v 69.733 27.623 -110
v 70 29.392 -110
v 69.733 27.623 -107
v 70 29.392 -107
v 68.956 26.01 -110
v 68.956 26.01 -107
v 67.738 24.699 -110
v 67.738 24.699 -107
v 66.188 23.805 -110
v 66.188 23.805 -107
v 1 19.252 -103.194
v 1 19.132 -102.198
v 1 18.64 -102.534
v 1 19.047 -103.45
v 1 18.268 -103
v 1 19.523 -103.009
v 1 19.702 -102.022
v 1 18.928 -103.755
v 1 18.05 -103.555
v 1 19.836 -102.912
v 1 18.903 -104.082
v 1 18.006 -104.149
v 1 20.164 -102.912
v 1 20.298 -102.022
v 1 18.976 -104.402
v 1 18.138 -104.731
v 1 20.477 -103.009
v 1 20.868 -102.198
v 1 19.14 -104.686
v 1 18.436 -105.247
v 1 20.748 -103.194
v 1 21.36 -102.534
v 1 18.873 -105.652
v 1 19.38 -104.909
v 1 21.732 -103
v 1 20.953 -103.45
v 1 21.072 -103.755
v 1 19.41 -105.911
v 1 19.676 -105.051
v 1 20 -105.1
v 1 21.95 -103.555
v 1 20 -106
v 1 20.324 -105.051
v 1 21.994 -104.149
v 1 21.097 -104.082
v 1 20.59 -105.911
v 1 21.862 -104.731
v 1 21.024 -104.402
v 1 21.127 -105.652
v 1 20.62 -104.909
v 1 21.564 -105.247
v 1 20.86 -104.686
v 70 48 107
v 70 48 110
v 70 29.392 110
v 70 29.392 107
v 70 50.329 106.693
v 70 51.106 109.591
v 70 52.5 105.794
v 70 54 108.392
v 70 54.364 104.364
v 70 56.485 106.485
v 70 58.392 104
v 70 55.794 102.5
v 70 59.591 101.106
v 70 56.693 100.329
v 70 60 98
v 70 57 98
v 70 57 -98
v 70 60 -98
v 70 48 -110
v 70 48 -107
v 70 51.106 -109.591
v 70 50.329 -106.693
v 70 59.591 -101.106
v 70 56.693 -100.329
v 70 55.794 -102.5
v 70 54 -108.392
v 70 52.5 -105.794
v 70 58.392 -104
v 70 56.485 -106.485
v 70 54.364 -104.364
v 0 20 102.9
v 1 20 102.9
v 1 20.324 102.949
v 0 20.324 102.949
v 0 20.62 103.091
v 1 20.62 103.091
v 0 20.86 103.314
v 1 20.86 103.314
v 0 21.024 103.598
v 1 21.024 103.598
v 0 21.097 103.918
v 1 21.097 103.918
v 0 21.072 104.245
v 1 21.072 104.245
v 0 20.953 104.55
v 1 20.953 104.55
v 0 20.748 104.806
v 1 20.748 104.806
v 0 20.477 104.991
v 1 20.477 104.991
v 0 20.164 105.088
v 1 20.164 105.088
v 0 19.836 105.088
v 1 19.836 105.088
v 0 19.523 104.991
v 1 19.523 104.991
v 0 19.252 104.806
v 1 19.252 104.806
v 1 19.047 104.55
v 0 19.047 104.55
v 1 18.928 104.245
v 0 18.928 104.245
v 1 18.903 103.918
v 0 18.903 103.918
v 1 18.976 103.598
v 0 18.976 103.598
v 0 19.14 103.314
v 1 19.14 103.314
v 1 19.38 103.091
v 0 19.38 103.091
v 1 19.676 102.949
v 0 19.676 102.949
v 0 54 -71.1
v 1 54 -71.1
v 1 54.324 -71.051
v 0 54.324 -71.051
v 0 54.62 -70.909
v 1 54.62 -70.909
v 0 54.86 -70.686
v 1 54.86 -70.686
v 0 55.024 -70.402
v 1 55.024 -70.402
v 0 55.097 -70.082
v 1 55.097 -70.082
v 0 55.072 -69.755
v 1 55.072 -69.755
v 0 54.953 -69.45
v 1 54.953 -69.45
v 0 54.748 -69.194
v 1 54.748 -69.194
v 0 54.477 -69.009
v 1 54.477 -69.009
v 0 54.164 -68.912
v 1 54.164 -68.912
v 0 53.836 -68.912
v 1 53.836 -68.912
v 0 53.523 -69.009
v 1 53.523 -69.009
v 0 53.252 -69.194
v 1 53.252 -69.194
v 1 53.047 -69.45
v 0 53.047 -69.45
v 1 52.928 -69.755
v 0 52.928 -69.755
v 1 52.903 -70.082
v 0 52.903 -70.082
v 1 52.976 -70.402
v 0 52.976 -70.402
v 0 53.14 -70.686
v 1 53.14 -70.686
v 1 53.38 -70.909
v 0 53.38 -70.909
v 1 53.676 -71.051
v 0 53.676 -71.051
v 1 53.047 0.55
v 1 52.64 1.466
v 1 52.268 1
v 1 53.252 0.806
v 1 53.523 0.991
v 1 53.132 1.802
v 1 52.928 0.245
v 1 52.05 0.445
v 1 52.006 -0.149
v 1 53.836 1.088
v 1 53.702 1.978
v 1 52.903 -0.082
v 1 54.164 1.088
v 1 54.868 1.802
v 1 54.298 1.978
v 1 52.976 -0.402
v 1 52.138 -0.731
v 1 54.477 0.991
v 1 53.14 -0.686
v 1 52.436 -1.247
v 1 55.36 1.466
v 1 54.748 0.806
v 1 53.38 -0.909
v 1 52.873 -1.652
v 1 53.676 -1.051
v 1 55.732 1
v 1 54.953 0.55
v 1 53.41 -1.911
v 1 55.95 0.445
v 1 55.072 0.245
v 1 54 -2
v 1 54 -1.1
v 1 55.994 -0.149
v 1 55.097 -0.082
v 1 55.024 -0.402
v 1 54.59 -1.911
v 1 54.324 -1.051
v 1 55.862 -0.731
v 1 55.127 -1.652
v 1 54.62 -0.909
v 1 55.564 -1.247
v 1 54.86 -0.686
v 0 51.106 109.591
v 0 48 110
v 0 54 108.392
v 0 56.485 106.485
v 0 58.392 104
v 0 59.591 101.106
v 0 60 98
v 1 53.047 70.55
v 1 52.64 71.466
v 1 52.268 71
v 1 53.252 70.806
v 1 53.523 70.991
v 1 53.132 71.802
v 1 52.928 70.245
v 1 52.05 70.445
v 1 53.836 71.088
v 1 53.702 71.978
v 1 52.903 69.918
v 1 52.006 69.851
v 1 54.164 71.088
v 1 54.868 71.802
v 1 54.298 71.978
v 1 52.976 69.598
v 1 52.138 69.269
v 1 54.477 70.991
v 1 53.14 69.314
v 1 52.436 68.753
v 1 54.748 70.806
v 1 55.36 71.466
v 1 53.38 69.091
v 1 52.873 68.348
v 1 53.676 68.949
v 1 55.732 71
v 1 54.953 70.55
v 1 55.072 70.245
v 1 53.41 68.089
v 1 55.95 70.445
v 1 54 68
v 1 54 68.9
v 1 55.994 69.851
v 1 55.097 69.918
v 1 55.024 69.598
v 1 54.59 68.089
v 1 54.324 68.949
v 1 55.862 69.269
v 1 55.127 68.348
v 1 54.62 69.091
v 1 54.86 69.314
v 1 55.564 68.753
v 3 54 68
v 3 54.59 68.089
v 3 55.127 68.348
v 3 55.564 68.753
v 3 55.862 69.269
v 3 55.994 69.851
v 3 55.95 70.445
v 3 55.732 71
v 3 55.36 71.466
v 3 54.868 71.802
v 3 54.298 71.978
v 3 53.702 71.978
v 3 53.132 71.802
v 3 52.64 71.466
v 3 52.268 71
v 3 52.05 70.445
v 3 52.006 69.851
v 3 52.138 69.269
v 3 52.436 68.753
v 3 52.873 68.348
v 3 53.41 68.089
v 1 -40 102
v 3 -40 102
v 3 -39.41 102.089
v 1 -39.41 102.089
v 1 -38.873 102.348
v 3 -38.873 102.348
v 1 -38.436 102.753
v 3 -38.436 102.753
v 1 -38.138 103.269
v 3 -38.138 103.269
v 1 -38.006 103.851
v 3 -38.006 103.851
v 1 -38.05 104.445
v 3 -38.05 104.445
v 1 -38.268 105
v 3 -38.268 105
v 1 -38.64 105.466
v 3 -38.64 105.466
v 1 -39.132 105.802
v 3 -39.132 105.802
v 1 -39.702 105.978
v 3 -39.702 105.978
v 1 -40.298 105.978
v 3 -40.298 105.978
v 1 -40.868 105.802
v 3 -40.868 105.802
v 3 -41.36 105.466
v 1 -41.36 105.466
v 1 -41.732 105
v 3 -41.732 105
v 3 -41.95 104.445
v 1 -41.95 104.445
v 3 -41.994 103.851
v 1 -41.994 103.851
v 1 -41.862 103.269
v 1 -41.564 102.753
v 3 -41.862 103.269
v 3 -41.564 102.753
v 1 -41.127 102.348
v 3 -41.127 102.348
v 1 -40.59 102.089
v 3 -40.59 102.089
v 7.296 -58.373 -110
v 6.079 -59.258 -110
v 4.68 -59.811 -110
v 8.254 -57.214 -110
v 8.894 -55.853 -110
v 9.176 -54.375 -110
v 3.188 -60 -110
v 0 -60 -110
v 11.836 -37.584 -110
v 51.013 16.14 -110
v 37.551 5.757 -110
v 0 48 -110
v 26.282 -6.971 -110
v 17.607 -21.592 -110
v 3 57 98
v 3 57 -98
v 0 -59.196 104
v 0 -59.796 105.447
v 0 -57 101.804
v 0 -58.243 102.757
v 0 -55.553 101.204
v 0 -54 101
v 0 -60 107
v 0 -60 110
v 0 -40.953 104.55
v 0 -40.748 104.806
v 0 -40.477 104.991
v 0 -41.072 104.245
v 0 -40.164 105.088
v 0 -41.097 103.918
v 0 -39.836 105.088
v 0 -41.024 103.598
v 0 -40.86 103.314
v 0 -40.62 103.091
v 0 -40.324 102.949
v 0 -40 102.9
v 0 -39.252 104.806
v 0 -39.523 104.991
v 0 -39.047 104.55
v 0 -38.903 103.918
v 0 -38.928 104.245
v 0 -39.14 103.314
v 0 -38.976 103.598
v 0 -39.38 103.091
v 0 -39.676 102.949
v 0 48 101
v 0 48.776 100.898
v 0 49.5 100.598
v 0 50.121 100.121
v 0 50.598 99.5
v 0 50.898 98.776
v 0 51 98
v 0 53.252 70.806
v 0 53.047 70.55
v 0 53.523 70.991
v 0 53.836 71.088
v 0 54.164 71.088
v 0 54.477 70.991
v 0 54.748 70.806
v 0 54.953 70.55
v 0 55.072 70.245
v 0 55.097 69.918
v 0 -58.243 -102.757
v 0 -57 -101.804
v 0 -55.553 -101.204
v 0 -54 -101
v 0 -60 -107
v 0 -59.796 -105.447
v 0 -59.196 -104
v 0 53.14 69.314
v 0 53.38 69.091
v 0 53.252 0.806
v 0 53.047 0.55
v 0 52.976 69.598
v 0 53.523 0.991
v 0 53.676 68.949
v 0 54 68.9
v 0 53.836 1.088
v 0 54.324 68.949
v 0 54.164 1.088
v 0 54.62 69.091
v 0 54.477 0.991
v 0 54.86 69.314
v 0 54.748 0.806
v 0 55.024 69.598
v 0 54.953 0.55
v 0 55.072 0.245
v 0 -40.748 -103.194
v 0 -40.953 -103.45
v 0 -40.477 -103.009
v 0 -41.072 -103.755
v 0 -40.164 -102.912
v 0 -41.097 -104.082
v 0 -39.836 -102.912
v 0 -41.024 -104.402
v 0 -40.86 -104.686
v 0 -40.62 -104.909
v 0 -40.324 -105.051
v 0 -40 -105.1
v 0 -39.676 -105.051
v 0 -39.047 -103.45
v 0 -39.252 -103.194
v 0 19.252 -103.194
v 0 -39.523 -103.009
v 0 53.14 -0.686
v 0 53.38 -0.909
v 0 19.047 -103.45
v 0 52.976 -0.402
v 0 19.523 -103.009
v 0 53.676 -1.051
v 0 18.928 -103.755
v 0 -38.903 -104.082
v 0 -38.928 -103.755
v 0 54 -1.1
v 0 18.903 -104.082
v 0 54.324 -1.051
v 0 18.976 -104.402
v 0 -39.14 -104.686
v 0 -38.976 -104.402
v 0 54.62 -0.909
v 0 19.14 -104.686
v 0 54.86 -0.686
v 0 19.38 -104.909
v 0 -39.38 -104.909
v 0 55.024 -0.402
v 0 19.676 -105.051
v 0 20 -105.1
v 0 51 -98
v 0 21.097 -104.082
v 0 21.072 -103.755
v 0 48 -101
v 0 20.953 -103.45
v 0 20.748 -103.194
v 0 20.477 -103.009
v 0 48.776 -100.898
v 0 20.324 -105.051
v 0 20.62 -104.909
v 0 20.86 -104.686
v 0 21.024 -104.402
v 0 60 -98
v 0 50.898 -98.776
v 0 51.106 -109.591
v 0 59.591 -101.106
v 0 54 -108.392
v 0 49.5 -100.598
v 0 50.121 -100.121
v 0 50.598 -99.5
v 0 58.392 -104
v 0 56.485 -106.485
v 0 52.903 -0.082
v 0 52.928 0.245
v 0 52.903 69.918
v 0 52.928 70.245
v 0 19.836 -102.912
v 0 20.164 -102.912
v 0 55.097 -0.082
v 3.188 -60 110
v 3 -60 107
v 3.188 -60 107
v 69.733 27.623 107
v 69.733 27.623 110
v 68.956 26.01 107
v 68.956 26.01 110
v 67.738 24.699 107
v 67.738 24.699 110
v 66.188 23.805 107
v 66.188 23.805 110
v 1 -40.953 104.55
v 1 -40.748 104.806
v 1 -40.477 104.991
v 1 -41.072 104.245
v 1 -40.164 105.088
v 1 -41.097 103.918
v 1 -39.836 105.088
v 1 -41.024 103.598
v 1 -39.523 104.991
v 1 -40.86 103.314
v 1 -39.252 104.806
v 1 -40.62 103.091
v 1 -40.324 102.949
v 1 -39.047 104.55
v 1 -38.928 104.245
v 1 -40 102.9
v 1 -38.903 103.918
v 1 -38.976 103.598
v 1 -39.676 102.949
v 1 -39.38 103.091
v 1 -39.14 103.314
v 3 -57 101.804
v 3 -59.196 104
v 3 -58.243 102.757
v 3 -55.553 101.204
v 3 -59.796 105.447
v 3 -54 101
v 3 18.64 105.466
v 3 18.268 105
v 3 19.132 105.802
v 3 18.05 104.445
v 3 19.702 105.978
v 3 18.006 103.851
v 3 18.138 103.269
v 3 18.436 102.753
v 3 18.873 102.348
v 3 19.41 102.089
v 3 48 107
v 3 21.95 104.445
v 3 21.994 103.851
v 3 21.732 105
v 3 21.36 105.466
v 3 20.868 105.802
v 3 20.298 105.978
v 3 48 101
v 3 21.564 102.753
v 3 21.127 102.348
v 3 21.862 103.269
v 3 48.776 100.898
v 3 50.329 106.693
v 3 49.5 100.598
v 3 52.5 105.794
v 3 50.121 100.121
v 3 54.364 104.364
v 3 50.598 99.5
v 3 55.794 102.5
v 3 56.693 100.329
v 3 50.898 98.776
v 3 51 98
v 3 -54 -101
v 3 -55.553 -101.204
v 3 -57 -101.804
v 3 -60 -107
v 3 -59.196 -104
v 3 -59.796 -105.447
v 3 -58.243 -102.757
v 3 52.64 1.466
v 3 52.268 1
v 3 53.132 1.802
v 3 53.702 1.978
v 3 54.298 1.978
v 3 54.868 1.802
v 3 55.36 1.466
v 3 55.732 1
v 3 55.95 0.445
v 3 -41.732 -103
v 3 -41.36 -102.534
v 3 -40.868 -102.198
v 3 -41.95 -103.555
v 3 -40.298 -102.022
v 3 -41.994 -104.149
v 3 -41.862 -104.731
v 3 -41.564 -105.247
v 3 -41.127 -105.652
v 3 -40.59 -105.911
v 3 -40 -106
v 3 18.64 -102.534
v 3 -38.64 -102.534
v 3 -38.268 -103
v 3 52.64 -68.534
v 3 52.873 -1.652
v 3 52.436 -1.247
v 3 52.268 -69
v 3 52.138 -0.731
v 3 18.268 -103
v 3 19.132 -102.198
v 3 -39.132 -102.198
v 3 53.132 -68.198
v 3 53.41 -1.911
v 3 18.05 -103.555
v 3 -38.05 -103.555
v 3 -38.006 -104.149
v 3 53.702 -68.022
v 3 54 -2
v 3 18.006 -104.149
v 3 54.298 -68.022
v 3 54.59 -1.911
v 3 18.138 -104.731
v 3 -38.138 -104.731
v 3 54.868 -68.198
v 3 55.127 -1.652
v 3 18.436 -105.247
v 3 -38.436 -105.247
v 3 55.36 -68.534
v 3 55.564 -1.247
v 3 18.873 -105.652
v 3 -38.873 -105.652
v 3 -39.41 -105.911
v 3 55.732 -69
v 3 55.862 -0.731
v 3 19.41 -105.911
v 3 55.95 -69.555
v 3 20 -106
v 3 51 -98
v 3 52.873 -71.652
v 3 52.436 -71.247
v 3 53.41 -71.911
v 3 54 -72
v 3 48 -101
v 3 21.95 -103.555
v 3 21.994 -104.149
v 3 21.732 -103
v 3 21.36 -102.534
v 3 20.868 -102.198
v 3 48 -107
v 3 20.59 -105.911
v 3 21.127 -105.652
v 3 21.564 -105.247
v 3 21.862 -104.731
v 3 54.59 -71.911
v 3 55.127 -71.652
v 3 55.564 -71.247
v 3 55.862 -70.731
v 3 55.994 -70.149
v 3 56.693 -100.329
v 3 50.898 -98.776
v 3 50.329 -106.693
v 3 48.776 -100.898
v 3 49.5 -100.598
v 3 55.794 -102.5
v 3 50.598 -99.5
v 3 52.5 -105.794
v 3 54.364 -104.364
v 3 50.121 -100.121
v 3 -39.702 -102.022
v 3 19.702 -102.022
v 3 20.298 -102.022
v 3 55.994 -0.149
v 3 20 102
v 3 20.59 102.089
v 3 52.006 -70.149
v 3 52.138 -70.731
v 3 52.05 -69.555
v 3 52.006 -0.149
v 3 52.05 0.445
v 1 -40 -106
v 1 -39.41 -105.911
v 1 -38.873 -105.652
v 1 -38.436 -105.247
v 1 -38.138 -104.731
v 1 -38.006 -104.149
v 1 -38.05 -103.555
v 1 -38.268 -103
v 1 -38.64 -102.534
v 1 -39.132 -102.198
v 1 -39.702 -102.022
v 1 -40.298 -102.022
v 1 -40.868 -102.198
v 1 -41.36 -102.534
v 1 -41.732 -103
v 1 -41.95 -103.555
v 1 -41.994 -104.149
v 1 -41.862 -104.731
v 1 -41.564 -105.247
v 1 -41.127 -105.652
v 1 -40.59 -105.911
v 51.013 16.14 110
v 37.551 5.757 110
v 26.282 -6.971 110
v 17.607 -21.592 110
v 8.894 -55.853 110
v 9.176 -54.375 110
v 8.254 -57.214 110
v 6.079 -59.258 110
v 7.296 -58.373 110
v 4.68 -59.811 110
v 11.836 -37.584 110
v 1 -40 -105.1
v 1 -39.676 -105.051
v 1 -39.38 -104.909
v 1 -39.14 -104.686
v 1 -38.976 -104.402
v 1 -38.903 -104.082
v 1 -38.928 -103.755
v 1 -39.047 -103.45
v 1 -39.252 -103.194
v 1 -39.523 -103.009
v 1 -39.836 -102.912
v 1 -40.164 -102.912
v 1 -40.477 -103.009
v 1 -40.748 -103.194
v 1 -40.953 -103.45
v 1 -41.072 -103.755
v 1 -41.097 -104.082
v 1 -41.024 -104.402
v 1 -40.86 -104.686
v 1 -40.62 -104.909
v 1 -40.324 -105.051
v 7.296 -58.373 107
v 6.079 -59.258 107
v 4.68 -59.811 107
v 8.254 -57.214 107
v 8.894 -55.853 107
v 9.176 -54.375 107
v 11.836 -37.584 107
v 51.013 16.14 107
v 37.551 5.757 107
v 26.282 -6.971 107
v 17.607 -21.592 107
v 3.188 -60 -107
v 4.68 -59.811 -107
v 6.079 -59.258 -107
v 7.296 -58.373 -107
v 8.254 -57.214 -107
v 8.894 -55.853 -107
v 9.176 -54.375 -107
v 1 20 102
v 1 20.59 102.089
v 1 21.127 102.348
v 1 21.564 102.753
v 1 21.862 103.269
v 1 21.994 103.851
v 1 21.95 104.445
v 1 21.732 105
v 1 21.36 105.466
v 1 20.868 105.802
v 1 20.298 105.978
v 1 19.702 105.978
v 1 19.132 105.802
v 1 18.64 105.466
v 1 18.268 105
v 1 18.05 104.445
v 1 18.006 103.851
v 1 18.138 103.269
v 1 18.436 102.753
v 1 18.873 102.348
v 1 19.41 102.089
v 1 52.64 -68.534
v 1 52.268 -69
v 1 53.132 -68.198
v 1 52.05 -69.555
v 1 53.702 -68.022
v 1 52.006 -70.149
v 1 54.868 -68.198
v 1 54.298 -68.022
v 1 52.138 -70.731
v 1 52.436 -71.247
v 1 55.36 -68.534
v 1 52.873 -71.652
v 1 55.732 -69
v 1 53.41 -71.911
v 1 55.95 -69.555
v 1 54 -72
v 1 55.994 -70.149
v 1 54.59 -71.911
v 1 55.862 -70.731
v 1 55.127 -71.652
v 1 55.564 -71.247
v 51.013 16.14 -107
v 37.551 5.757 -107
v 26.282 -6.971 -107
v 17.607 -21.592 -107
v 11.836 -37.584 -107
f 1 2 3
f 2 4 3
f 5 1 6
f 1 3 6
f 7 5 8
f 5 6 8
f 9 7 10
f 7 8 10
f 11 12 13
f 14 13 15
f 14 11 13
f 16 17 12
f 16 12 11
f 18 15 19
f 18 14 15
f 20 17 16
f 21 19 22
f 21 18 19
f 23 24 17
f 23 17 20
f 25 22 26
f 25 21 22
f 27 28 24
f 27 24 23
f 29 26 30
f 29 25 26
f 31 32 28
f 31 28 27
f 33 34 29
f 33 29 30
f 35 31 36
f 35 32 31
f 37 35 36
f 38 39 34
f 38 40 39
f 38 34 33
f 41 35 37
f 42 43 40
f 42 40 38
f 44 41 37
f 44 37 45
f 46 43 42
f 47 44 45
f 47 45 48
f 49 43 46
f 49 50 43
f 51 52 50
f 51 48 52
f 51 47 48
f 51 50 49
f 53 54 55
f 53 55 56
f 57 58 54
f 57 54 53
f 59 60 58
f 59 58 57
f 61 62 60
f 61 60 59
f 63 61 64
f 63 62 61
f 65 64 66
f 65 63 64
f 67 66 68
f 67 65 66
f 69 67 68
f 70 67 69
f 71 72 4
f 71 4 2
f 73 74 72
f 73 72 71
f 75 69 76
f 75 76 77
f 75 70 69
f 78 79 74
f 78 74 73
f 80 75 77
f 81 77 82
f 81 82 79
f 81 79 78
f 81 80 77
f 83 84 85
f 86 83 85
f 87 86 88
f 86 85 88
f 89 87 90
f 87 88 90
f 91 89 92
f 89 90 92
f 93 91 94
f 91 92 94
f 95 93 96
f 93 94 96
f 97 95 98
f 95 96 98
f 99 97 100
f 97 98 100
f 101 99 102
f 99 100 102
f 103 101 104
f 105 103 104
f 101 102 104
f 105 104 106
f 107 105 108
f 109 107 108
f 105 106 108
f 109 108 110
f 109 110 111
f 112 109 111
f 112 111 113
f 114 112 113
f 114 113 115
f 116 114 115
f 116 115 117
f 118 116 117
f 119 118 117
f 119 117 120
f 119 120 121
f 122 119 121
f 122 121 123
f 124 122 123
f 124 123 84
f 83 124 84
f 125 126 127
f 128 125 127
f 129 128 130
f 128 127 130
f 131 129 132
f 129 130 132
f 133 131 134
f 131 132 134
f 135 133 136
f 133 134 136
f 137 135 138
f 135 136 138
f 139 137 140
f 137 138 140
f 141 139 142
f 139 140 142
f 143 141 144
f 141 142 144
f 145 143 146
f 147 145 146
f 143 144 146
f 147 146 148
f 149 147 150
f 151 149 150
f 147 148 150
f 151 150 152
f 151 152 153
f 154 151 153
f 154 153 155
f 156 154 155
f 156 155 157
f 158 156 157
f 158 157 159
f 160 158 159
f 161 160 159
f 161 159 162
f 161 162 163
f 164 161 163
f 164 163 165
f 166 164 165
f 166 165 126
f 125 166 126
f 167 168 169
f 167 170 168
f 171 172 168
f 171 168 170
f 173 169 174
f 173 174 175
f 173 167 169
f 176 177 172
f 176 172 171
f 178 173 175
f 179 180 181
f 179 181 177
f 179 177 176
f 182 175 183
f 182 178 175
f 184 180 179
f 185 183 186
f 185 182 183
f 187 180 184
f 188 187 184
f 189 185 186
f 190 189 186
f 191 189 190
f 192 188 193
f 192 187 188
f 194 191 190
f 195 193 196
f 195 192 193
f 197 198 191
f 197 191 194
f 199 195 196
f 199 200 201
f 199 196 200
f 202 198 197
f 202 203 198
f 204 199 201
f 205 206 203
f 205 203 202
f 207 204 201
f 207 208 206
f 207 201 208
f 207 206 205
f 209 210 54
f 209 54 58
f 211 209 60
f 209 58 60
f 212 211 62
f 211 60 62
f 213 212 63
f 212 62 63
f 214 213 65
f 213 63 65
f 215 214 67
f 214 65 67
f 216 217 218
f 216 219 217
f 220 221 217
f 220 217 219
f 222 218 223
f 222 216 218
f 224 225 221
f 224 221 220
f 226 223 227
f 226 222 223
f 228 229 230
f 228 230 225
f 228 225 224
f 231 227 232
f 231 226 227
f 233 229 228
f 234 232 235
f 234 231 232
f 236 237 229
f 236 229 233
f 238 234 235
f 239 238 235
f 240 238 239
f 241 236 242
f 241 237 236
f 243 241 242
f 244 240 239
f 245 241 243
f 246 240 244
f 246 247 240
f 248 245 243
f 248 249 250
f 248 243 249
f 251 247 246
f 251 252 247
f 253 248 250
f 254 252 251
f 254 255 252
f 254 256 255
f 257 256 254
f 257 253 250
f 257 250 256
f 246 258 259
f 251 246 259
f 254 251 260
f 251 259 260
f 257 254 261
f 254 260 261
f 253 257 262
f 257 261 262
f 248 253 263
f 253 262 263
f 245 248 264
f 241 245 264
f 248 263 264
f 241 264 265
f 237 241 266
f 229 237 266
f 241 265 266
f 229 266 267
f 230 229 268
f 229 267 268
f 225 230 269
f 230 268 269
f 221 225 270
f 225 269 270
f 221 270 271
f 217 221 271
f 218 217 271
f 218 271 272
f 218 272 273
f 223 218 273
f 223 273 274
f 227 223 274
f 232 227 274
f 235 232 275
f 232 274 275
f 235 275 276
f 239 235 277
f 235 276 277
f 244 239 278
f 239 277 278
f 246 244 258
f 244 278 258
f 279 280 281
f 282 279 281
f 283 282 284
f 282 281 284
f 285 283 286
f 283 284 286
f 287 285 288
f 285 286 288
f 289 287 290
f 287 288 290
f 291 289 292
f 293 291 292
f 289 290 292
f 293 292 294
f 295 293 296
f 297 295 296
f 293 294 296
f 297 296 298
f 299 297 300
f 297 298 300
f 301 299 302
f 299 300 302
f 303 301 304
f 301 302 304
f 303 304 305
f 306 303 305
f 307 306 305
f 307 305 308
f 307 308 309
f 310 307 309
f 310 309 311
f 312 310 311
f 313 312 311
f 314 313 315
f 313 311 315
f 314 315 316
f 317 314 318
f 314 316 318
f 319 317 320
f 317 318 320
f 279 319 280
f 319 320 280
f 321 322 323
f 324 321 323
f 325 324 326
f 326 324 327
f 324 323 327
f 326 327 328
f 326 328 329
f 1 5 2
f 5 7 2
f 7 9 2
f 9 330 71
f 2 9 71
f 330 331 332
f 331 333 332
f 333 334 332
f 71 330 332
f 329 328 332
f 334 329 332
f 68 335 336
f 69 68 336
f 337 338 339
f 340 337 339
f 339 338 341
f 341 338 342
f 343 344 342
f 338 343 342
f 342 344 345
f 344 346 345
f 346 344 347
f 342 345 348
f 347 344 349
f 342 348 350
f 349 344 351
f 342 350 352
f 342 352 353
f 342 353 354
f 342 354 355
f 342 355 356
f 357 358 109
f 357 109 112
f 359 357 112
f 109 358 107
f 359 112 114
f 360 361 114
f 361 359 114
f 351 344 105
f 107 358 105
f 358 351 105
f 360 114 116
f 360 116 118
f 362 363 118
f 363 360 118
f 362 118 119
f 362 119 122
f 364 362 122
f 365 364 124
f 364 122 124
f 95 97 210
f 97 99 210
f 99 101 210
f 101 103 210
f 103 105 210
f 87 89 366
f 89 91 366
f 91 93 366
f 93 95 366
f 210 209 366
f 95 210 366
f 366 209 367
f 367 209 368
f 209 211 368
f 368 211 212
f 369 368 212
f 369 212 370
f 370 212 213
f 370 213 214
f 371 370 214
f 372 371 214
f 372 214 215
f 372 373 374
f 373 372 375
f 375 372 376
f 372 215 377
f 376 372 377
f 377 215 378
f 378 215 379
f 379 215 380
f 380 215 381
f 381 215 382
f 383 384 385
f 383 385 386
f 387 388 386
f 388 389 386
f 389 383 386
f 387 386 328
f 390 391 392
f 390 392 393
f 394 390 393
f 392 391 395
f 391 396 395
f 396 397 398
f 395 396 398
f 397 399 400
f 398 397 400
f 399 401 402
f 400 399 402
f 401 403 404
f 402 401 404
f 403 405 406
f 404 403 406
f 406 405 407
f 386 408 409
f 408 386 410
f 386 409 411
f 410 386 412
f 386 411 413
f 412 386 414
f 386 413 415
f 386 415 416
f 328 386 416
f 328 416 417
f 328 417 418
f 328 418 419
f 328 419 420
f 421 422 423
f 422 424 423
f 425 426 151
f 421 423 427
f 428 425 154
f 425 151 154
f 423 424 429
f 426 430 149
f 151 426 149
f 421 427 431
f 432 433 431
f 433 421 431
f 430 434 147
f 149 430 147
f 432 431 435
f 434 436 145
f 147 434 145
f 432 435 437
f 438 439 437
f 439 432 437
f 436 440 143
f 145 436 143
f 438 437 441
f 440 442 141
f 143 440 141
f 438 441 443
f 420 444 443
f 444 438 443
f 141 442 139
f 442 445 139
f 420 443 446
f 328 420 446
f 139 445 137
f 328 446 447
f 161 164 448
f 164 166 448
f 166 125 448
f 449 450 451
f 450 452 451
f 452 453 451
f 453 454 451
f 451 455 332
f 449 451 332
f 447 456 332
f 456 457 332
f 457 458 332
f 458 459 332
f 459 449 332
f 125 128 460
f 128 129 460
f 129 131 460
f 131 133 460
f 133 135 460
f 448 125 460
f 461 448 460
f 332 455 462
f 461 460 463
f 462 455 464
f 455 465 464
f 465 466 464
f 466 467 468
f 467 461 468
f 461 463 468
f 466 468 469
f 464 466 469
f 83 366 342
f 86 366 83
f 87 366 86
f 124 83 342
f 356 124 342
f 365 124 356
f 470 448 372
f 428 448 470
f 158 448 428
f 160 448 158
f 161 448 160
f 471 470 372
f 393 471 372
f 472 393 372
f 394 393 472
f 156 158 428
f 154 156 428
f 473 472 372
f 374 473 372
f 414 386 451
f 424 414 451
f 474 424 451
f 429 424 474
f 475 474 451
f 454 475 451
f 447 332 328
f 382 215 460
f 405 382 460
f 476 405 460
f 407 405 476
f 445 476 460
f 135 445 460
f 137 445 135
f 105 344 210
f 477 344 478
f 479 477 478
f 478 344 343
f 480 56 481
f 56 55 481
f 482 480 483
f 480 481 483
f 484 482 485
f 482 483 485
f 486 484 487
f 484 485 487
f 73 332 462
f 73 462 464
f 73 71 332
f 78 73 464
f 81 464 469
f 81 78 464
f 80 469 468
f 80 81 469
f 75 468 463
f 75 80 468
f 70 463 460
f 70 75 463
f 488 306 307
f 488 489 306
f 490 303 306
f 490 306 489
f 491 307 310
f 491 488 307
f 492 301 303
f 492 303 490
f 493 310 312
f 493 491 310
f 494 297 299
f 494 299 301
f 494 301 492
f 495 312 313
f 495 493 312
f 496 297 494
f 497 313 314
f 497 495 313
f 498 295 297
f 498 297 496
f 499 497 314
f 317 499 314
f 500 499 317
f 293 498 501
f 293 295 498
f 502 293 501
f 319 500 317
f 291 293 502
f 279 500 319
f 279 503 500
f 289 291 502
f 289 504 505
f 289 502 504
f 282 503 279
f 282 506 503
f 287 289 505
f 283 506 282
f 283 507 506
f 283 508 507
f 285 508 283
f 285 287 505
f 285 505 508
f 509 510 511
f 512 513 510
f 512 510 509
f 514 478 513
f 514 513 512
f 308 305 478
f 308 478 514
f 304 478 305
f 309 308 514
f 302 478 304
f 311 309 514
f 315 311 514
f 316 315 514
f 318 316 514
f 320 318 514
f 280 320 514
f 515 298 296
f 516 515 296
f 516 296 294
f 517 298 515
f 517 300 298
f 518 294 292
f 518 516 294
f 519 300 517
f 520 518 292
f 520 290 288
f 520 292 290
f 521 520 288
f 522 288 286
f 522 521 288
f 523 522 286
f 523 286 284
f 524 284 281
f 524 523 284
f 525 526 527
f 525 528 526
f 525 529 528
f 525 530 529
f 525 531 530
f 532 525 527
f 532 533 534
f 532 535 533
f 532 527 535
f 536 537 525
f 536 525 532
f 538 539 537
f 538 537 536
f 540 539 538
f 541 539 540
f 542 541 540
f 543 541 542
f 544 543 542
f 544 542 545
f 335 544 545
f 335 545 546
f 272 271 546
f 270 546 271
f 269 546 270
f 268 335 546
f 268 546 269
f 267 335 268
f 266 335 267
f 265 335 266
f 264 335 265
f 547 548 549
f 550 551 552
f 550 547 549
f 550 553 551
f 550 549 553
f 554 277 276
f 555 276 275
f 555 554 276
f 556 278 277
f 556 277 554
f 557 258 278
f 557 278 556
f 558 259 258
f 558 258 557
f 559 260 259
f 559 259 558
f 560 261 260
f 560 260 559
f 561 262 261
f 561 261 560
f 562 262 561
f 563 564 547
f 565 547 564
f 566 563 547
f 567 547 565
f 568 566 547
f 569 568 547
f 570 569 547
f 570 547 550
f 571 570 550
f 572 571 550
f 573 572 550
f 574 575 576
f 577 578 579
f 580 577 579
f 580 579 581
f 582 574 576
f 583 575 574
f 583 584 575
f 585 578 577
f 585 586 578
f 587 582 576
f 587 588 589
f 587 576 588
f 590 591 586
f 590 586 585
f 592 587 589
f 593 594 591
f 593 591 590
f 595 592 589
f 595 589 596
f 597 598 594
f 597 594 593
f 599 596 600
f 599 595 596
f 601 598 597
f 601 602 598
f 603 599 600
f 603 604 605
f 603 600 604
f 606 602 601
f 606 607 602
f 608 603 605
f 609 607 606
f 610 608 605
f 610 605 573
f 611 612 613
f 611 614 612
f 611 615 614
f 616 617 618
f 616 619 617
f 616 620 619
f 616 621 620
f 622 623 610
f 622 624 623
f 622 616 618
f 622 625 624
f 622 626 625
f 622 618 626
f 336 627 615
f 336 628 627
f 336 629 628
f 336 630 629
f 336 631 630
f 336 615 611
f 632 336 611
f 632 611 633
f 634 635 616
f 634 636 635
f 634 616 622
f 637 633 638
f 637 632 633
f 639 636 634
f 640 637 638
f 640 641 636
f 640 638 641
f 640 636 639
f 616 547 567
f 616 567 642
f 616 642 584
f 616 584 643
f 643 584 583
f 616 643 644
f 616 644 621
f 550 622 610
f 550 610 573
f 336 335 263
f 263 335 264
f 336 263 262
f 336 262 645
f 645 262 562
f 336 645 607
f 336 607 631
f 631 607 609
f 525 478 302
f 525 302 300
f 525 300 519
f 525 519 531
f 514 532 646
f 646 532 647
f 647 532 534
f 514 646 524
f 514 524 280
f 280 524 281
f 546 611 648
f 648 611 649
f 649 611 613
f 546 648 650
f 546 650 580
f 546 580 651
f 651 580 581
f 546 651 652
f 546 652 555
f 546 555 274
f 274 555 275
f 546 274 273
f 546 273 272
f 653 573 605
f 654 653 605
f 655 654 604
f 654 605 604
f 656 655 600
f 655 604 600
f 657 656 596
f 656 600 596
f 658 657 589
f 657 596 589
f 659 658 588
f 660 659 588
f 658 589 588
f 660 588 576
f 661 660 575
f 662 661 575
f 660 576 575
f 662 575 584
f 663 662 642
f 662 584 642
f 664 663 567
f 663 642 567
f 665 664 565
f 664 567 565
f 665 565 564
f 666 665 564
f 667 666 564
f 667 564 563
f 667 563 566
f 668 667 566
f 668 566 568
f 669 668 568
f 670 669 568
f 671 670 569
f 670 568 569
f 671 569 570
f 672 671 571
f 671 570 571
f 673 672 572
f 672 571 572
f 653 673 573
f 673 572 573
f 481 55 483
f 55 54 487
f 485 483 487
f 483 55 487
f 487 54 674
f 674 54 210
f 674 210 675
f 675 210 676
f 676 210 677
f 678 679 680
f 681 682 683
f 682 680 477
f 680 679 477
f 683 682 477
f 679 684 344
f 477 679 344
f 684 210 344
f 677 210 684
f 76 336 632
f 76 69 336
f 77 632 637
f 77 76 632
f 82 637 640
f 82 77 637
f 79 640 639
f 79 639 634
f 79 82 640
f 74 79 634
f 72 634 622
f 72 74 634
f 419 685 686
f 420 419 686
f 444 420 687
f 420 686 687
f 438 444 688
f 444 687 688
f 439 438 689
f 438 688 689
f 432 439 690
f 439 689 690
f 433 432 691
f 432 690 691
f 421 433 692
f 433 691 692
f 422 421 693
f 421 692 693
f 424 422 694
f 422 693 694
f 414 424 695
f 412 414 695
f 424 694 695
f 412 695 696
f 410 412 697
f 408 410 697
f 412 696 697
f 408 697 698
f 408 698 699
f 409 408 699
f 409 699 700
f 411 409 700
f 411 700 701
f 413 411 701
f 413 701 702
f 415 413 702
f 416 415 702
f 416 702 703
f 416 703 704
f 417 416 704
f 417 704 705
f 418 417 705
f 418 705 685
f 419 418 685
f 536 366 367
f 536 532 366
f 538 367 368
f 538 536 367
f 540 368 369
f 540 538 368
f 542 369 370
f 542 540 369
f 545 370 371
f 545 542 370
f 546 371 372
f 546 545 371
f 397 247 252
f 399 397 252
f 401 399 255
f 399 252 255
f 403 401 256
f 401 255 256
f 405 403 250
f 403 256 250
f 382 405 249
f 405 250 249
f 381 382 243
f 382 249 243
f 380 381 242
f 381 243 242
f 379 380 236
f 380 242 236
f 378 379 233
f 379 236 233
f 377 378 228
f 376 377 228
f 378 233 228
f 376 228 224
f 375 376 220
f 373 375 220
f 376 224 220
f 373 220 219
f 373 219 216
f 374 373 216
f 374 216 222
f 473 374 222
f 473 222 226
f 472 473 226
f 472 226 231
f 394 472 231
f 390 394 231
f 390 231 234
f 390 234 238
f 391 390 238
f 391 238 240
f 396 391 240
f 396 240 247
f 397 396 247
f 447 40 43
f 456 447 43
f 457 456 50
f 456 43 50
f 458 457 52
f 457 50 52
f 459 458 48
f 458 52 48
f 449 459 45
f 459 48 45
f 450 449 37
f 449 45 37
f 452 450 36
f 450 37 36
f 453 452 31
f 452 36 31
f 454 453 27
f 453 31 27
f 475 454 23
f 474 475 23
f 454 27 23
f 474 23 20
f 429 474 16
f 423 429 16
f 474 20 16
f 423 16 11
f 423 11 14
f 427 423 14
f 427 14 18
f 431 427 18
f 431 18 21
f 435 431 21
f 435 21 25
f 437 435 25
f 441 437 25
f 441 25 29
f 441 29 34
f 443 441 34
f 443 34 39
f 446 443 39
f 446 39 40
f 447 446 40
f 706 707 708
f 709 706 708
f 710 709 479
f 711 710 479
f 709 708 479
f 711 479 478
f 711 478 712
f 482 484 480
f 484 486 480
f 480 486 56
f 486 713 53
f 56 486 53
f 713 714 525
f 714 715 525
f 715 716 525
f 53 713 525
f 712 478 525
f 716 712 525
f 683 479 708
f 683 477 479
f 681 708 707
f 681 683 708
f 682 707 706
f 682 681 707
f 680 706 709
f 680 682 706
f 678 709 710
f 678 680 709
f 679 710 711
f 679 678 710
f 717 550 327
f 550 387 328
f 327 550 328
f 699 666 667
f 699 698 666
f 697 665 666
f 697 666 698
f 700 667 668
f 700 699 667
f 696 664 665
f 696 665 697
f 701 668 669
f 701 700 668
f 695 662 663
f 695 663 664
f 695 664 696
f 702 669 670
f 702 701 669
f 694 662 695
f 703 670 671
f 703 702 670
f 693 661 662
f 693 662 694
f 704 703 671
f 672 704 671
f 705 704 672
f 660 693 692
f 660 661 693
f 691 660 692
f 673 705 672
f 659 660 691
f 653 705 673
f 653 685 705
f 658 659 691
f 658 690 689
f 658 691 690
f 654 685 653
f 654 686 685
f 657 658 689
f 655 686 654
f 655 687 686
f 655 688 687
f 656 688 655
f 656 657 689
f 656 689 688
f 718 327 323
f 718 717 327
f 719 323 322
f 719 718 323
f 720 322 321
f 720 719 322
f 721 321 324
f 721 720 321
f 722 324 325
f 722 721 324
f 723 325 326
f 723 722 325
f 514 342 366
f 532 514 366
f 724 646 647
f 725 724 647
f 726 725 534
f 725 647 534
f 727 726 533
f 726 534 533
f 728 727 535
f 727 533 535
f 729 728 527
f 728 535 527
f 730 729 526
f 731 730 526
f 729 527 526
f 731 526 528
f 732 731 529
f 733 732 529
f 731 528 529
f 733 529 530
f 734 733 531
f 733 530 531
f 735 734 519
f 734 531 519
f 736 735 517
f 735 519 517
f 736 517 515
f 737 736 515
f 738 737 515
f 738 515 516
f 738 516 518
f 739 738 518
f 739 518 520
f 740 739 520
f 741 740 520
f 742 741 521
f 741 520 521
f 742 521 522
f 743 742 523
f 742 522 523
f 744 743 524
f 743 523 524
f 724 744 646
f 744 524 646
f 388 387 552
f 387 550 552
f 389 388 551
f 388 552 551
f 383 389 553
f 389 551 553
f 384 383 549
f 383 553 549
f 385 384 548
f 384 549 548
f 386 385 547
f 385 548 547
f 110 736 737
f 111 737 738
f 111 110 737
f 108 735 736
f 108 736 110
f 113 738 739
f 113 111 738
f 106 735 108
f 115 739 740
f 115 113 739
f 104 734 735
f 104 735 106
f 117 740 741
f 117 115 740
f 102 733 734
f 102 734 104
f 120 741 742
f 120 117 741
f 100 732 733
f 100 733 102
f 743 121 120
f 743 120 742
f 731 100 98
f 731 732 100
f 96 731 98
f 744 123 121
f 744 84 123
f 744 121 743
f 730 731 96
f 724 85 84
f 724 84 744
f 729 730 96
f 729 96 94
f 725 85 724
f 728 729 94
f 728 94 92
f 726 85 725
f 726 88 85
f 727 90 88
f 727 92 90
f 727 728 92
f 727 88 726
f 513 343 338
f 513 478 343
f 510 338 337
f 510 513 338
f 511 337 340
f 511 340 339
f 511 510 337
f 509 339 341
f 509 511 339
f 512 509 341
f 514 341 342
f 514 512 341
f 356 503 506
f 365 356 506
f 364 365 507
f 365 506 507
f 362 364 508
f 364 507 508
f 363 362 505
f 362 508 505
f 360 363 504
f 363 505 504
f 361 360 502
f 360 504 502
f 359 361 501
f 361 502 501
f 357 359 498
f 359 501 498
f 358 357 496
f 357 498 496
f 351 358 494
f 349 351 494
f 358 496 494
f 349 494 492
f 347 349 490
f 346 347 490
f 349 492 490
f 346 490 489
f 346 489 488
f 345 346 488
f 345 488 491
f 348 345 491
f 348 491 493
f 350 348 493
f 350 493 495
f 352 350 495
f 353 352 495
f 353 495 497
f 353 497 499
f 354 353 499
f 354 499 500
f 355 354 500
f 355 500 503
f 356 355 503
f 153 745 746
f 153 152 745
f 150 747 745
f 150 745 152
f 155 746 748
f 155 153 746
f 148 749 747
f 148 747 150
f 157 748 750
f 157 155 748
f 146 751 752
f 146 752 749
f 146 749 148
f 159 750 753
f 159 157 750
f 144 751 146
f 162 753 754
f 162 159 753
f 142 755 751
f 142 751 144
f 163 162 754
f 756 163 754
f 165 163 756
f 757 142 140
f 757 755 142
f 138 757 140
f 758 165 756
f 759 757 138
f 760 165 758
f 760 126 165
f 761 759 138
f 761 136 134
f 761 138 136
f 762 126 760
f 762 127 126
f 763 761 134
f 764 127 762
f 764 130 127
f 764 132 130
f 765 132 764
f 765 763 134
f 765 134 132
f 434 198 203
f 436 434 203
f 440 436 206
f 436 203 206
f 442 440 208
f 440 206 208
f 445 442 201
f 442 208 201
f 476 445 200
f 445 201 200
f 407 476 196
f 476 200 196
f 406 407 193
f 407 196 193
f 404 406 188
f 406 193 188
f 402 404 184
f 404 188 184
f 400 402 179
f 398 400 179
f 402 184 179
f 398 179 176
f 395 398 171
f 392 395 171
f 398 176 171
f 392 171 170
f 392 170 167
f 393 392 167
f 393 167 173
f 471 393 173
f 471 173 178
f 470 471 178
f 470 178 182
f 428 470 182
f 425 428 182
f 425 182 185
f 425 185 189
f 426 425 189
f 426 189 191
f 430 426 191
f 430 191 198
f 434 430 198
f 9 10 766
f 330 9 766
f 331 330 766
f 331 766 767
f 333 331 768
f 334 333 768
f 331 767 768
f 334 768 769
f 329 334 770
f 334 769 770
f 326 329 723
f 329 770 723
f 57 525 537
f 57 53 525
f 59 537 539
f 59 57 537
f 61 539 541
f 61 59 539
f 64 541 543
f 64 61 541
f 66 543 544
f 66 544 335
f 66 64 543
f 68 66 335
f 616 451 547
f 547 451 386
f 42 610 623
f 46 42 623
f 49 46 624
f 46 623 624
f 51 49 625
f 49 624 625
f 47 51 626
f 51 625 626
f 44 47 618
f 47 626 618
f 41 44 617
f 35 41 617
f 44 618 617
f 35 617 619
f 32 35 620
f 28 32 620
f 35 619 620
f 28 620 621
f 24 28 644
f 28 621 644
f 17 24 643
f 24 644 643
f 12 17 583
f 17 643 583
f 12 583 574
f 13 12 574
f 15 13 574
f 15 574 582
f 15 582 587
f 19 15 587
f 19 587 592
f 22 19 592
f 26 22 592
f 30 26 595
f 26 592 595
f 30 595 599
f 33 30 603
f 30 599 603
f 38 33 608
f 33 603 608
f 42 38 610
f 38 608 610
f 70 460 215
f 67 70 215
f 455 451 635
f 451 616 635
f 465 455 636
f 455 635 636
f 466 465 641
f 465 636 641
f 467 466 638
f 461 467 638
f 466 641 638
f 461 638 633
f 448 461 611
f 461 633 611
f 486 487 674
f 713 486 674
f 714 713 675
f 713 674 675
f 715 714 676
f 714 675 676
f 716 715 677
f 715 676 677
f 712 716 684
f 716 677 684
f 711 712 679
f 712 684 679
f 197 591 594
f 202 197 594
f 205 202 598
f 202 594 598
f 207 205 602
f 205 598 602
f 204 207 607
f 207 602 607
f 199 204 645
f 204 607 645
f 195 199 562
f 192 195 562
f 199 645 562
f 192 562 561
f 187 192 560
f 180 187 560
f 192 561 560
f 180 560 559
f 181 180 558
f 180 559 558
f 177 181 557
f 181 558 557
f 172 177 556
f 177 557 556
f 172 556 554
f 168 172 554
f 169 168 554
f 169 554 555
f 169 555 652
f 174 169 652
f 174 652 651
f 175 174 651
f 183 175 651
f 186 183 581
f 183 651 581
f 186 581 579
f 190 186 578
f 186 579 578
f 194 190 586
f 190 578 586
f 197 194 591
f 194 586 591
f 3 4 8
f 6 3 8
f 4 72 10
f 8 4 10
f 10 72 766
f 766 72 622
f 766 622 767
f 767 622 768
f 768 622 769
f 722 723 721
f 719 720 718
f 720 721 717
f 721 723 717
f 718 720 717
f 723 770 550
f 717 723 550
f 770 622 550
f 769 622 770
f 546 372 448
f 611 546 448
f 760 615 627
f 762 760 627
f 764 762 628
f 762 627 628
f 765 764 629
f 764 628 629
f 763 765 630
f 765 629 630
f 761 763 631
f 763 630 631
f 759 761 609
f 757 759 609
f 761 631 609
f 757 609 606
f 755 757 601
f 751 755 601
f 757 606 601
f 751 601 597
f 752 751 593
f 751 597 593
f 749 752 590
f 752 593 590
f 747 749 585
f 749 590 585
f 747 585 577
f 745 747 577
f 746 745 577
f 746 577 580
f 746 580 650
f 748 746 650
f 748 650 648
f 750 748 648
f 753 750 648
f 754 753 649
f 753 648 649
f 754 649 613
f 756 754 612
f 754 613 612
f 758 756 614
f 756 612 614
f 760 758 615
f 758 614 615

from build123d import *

# Parameters (mm, degrees)
BOSS_EXTRUDE1_DEPTH = 70
BOSS_EXTRUDE2_DEPTH = 3
SKETCH2_R           = 90
CUT_EXTRUDE1_DEPTH  = 239.537208838
FILLET2_R           = 9
FILLET3_R           = 3
FILLET4_R           = 12
FILLET5_R           = 6
SKETCH3_R           = 2
CUT_EXTRUDE2_DEPTH  = 2
SKETCH4_R           = 1.1
CUT_EXTRUDE3_DEPTH  = 3


with BuildPart() as part:
    # Sketch1 → Boss-Extrude1 (new body)
    with BuildSketch(Plane(origin=(0, 0, 0), x_dir=(0, 0, -1), z_dir=(1, 0, 0))):
        Polygon((-107, -60), (-107, 57), (107, 57), (107, -60), (110, -60), (110, 60), (-110, 60), (-110, -60), align=None)
    extrude(amount=BOSS_EXTRUDE1_DEPTH)

    # Sketch1<3> → Boss-Extrude2 (add)
    with BuildSketch(Plane(origin=(0, 0, 0), x_dir=(0, 0, -1), z_dir=(1, 0, 0))):
        Polygon((107, 57), (-107, 57), (-107, -60), (-101, -60), (-101, 51), (101, 51), (101, -60), (107, -60), align=None)
    extrude(amount=BOSS_EXTRUDE2_DEPTH)

    # Sketch2 → Cut-Extrude1 (cut, through all)
    with BuildSketch(Plane.XY.offset(110)):
        with Locations((99, -60)):
            Circle(SKETCH2_R)
    extrude(amount=-CUT_EXTRUDE1_DEPTH, mode=Mode.SUBTRACT)

    # Fillet2
    fillet2_edges = [part.edges().sort_by_distance(p)[0] for p in [
        (36.5, 57, -107),
        (36.5, 57, 107),
    ]]
    fillet(fillet2_edges, radius=FILLET2_R)

    # Fillet3
    fillet3_edges = [part.edges().sort_by_distance(p)[0] for p in [
        (1.5, 51, -101),
        (1.5, 51, 101),
    ]]
    fillet(fillet3_edges, radius=FILLET3_R)

    # Fillet4
    fillet4_edges = [part.edges().sort_by_distance(p)[0] for p in [
        (35, 60, 110),
        (35, 60, -110),
    ]]
    fillet(fillet4_edges, radius=FILLET4_R)

    # Fillet5
    fillet5_edges = [part.edges().sort_by_distance(p)[0] for p in [
        (1.5, -60, 101),
        (9, -60, 108.5),
        (1.5, -60, -101),
        (9, -60, -108.5),
        (70, 25.199765258, -108.5),
        (70, 25.199765258, 108.5),
    ]]
    fillet(fillet5_edges, radius=FILLET5_R)

    # Sketch3 → Cut-Extrude2 (cut)
    with BuildSketch(Plane(origin=(3, 0, 0), x_dir=(0, 0, -1), z_dir=(1, 0, 0))):
        with Locations((-104, -40)):
            Circle(SKETCH3_R)
        with Locations((-104, 20)):
            Circle(SKETCH3_R)
        with Locations((-70, 54)):
            Circle(SKETCH3_R)
        with Locations((0, 54)):
            Circle(SKETCH3_R)
        with Locations((70, 54)):
            Circle(SKETCH3_R)
        with Locations((104, 20)):
            Circle(SKETCH3_R)
        with Locations((104, -40)):
            Circle(SKETCH3_R)
    extrude(amount=-CUT_EXTRUDE2_DEPTH, mode=Mode.SUBTRACT)

    # Sketch4 → Cut-Extrude3 (cut)
    with BuildSketch(Plane(origin=(3, 0, 0), x_dir=(0, 0, -1), z_dir=(1, 0, 0))):
        with Locations((-104, -40)):
            Circle(SKETCH4_R)
        with Locations((-104, 20)):
            Circle(SKETCH4_R)
        with Locations((-70, 54)):
            Circle(SKETCH4_R)
        with Locations((0, 54)):
            Circle(SKETCH4_R)
        with Locations((70, 54)):
            Circle(SKETCH4_R)
        with Locations((104, 20)):
            Circle(SKETCH4_R)
        with Locations((104, -40)):
            Circle(SKETCH4_R)
    extrude(amount=-CUT_EXTRUDE3_DEPTH, mode=Mode.SUBTRACT)


solid = part.part
